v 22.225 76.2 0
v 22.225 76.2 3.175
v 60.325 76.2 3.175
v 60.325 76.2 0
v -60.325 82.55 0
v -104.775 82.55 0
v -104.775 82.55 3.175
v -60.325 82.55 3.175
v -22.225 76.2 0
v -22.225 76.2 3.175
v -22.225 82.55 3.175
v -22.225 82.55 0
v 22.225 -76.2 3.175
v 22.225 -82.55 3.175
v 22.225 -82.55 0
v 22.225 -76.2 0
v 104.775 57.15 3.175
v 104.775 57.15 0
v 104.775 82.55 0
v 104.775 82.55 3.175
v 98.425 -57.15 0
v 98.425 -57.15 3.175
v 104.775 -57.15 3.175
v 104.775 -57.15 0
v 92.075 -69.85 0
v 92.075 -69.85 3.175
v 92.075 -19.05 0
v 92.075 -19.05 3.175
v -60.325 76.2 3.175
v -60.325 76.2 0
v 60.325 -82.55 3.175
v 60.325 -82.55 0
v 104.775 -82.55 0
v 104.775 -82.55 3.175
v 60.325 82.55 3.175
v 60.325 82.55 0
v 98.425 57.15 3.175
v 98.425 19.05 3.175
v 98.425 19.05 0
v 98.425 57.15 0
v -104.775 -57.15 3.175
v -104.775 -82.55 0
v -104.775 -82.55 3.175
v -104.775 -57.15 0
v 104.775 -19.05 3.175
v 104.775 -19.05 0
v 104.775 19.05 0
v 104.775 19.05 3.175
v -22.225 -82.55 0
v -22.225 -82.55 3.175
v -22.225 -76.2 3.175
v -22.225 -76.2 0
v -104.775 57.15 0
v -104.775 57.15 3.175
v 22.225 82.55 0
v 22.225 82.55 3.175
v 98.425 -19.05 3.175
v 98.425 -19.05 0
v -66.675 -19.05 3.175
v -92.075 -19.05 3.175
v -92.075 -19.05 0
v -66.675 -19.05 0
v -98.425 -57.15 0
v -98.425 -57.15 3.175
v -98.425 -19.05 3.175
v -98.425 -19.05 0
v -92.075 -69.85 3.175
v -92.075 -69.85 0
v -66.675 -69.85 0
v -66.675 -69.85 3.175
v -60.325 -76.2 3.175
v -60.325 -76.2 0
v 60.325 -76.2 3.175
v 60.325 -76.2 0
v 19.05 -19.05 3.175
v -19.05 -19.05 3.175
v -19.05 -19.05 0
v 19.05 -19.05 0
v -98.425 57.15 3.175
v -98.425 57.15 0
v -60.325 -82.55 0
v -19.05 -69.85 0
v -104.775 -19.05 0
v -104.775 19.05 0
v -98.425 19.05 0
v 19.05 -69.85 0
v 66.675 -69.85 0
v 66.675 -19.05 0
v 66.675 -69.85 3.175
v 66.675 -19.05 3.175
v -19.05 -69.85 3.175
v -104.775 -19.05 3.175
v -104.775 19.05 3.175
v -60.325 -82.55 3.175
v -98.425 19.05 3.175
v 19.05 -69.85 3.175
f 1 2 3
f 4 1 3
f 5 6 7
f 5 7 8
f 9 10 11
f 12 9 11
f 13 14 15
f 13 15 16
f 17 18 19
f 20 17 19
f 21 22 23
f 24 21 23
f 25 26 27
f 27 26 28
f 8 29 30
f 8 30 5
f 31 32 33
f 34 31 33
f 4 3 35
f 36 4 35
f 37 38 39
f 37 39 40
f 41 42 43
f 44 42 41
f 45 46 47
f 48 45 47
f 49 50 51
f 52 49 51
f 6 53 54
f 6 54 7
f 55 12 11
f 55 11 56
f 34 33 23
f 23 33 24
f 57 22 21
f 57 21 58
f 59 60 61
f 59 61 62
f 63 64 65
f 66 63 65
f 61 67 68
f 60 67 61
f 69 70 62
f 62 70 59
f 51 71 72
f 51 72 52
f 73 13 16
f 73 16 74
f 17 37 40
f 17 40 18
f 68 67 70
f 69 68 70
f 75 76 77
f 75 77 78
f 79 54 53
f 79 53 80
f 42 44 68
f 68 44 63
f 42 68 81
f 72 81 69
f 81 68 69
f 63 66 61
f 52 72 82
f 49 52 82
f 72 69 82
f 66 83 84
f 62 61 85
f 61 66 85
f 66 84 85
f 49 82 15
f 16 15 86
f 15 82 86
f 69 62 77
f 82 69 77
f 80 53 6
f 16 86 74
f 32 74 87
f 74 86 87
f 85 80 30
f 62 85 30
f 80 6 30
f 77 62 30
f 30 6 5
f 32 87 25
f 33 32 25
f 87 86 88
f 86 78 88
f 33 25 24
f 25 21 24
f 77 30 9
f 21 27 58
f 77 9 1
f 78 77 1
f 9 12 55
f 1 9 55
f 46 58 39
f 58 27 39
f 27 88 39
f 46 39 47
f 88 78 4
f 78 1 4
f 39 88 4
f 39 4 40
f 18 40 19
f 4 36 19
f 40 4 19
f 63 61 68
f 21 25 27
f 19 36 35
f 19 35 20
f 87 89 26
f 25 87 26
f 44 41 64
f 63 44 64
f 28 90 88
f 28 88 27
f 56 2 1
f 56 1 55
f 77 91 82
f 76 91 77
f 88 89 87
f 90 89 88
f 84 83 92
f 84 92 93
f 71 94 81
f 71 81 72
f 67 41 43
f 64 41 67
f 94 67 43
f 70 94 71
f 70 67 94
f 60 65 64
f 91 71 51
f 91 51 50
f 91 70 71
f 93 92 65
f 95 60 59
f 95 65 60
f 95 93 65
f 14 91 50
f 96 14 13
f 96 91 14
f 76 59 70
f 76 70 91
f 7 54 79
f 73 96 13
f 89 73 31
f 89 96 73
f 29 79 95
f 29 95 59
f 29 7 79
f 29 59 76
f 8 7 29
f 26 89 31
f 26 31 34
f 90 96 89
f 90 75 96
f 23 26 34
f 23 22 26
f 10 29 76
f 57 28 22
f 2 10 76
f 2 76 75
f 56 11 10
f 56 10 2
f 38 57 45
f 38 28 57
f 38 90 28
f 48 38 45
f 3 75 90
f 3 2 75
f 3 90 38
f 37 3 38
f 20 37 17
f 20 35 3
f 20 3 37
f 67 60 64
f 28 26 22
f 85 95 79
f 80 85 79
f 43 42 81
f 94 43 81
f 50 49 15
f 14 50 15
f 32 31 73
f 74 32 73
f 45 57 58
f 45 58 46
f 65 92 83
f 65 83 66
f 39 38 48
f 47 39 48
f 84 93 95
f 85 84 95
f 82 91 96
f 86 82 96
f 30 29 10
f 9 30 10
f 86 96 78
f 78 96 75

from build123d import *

# Parameters (mm, degrees)
F0_W     = 209.55
F0_H     = 165.1
F1_DEPTH = 3.175
F2_W     = 6.35
F2_H     = 38.1
F2_W_2   = 38.1
F2_H_2   = 6.35
F3_DEPTH = 25.4
F4_W     = 25.4
F4_H     = 50.8
F4_W_2   = 38.1
F5_DEPTH = 25.4


# Not quite as in the source:
# - a length typed as a fraction of an inch, garbled in the dataset ("3 / 203.2 mm" for 3/8 in), is restored


with BuildPart() as f1:
    # F0 (on Top) → F1 (new body)
    with BuildSketch(Plane.XY):
        Rectangle(F0_W, F0_H)
    extrude(amount=F1_DEPTH)

    # F2 (on face) → F3 (cut)
    with BuildSketch(Plane.XY.offset(3.175)):
        with Locations((-101.6, 38.1)):
            Rectangle(F2_W, F2_H)
        with Locations((-101.6, -38.1)):
            Rectangle(F2_W, F2_H)
        with Locations((101.6, 38.1)):
            Rectangle(F2_W, F2_H)
        with Locations((101.6, -38.1)):
            Rectangle(F2_W, F2_H)
        with Locations((-41.275, -79.375)):
            Rectangle(F2_W_2, F2_H_2)
        with Locations((41.275, -79.375)):
            Rectangle(F2_W_2, F2_H_2)
        with Locations((41.275, 79.375)):
            Rectangle(F2_W_2, F2_H_2)
        with Locations((-41.275, 79.375)):
            Rectangle(F2_W_2, F2_H_2)
    extrude(amount=-F3_DEPTH, mode=Mode.SUBTRACT)

    # F4 (on face) → F5 (cut)
    with BuildSketch(Plane.XY.offset(3.175)):
        with Locations((-79.375, -44.45)):
            Rectangle(F4_W, F4_H)
        with Locations((79.375, -44.45)):
            Rectangle(F4_W, F4_H)
        with Locations((0, -44.45)):
            Rectangle(F4_W_2, F4_H)
    extrude(amount=-F5_DEPTH, mode=Mode.SUBTRACT)


solid = f1.part
